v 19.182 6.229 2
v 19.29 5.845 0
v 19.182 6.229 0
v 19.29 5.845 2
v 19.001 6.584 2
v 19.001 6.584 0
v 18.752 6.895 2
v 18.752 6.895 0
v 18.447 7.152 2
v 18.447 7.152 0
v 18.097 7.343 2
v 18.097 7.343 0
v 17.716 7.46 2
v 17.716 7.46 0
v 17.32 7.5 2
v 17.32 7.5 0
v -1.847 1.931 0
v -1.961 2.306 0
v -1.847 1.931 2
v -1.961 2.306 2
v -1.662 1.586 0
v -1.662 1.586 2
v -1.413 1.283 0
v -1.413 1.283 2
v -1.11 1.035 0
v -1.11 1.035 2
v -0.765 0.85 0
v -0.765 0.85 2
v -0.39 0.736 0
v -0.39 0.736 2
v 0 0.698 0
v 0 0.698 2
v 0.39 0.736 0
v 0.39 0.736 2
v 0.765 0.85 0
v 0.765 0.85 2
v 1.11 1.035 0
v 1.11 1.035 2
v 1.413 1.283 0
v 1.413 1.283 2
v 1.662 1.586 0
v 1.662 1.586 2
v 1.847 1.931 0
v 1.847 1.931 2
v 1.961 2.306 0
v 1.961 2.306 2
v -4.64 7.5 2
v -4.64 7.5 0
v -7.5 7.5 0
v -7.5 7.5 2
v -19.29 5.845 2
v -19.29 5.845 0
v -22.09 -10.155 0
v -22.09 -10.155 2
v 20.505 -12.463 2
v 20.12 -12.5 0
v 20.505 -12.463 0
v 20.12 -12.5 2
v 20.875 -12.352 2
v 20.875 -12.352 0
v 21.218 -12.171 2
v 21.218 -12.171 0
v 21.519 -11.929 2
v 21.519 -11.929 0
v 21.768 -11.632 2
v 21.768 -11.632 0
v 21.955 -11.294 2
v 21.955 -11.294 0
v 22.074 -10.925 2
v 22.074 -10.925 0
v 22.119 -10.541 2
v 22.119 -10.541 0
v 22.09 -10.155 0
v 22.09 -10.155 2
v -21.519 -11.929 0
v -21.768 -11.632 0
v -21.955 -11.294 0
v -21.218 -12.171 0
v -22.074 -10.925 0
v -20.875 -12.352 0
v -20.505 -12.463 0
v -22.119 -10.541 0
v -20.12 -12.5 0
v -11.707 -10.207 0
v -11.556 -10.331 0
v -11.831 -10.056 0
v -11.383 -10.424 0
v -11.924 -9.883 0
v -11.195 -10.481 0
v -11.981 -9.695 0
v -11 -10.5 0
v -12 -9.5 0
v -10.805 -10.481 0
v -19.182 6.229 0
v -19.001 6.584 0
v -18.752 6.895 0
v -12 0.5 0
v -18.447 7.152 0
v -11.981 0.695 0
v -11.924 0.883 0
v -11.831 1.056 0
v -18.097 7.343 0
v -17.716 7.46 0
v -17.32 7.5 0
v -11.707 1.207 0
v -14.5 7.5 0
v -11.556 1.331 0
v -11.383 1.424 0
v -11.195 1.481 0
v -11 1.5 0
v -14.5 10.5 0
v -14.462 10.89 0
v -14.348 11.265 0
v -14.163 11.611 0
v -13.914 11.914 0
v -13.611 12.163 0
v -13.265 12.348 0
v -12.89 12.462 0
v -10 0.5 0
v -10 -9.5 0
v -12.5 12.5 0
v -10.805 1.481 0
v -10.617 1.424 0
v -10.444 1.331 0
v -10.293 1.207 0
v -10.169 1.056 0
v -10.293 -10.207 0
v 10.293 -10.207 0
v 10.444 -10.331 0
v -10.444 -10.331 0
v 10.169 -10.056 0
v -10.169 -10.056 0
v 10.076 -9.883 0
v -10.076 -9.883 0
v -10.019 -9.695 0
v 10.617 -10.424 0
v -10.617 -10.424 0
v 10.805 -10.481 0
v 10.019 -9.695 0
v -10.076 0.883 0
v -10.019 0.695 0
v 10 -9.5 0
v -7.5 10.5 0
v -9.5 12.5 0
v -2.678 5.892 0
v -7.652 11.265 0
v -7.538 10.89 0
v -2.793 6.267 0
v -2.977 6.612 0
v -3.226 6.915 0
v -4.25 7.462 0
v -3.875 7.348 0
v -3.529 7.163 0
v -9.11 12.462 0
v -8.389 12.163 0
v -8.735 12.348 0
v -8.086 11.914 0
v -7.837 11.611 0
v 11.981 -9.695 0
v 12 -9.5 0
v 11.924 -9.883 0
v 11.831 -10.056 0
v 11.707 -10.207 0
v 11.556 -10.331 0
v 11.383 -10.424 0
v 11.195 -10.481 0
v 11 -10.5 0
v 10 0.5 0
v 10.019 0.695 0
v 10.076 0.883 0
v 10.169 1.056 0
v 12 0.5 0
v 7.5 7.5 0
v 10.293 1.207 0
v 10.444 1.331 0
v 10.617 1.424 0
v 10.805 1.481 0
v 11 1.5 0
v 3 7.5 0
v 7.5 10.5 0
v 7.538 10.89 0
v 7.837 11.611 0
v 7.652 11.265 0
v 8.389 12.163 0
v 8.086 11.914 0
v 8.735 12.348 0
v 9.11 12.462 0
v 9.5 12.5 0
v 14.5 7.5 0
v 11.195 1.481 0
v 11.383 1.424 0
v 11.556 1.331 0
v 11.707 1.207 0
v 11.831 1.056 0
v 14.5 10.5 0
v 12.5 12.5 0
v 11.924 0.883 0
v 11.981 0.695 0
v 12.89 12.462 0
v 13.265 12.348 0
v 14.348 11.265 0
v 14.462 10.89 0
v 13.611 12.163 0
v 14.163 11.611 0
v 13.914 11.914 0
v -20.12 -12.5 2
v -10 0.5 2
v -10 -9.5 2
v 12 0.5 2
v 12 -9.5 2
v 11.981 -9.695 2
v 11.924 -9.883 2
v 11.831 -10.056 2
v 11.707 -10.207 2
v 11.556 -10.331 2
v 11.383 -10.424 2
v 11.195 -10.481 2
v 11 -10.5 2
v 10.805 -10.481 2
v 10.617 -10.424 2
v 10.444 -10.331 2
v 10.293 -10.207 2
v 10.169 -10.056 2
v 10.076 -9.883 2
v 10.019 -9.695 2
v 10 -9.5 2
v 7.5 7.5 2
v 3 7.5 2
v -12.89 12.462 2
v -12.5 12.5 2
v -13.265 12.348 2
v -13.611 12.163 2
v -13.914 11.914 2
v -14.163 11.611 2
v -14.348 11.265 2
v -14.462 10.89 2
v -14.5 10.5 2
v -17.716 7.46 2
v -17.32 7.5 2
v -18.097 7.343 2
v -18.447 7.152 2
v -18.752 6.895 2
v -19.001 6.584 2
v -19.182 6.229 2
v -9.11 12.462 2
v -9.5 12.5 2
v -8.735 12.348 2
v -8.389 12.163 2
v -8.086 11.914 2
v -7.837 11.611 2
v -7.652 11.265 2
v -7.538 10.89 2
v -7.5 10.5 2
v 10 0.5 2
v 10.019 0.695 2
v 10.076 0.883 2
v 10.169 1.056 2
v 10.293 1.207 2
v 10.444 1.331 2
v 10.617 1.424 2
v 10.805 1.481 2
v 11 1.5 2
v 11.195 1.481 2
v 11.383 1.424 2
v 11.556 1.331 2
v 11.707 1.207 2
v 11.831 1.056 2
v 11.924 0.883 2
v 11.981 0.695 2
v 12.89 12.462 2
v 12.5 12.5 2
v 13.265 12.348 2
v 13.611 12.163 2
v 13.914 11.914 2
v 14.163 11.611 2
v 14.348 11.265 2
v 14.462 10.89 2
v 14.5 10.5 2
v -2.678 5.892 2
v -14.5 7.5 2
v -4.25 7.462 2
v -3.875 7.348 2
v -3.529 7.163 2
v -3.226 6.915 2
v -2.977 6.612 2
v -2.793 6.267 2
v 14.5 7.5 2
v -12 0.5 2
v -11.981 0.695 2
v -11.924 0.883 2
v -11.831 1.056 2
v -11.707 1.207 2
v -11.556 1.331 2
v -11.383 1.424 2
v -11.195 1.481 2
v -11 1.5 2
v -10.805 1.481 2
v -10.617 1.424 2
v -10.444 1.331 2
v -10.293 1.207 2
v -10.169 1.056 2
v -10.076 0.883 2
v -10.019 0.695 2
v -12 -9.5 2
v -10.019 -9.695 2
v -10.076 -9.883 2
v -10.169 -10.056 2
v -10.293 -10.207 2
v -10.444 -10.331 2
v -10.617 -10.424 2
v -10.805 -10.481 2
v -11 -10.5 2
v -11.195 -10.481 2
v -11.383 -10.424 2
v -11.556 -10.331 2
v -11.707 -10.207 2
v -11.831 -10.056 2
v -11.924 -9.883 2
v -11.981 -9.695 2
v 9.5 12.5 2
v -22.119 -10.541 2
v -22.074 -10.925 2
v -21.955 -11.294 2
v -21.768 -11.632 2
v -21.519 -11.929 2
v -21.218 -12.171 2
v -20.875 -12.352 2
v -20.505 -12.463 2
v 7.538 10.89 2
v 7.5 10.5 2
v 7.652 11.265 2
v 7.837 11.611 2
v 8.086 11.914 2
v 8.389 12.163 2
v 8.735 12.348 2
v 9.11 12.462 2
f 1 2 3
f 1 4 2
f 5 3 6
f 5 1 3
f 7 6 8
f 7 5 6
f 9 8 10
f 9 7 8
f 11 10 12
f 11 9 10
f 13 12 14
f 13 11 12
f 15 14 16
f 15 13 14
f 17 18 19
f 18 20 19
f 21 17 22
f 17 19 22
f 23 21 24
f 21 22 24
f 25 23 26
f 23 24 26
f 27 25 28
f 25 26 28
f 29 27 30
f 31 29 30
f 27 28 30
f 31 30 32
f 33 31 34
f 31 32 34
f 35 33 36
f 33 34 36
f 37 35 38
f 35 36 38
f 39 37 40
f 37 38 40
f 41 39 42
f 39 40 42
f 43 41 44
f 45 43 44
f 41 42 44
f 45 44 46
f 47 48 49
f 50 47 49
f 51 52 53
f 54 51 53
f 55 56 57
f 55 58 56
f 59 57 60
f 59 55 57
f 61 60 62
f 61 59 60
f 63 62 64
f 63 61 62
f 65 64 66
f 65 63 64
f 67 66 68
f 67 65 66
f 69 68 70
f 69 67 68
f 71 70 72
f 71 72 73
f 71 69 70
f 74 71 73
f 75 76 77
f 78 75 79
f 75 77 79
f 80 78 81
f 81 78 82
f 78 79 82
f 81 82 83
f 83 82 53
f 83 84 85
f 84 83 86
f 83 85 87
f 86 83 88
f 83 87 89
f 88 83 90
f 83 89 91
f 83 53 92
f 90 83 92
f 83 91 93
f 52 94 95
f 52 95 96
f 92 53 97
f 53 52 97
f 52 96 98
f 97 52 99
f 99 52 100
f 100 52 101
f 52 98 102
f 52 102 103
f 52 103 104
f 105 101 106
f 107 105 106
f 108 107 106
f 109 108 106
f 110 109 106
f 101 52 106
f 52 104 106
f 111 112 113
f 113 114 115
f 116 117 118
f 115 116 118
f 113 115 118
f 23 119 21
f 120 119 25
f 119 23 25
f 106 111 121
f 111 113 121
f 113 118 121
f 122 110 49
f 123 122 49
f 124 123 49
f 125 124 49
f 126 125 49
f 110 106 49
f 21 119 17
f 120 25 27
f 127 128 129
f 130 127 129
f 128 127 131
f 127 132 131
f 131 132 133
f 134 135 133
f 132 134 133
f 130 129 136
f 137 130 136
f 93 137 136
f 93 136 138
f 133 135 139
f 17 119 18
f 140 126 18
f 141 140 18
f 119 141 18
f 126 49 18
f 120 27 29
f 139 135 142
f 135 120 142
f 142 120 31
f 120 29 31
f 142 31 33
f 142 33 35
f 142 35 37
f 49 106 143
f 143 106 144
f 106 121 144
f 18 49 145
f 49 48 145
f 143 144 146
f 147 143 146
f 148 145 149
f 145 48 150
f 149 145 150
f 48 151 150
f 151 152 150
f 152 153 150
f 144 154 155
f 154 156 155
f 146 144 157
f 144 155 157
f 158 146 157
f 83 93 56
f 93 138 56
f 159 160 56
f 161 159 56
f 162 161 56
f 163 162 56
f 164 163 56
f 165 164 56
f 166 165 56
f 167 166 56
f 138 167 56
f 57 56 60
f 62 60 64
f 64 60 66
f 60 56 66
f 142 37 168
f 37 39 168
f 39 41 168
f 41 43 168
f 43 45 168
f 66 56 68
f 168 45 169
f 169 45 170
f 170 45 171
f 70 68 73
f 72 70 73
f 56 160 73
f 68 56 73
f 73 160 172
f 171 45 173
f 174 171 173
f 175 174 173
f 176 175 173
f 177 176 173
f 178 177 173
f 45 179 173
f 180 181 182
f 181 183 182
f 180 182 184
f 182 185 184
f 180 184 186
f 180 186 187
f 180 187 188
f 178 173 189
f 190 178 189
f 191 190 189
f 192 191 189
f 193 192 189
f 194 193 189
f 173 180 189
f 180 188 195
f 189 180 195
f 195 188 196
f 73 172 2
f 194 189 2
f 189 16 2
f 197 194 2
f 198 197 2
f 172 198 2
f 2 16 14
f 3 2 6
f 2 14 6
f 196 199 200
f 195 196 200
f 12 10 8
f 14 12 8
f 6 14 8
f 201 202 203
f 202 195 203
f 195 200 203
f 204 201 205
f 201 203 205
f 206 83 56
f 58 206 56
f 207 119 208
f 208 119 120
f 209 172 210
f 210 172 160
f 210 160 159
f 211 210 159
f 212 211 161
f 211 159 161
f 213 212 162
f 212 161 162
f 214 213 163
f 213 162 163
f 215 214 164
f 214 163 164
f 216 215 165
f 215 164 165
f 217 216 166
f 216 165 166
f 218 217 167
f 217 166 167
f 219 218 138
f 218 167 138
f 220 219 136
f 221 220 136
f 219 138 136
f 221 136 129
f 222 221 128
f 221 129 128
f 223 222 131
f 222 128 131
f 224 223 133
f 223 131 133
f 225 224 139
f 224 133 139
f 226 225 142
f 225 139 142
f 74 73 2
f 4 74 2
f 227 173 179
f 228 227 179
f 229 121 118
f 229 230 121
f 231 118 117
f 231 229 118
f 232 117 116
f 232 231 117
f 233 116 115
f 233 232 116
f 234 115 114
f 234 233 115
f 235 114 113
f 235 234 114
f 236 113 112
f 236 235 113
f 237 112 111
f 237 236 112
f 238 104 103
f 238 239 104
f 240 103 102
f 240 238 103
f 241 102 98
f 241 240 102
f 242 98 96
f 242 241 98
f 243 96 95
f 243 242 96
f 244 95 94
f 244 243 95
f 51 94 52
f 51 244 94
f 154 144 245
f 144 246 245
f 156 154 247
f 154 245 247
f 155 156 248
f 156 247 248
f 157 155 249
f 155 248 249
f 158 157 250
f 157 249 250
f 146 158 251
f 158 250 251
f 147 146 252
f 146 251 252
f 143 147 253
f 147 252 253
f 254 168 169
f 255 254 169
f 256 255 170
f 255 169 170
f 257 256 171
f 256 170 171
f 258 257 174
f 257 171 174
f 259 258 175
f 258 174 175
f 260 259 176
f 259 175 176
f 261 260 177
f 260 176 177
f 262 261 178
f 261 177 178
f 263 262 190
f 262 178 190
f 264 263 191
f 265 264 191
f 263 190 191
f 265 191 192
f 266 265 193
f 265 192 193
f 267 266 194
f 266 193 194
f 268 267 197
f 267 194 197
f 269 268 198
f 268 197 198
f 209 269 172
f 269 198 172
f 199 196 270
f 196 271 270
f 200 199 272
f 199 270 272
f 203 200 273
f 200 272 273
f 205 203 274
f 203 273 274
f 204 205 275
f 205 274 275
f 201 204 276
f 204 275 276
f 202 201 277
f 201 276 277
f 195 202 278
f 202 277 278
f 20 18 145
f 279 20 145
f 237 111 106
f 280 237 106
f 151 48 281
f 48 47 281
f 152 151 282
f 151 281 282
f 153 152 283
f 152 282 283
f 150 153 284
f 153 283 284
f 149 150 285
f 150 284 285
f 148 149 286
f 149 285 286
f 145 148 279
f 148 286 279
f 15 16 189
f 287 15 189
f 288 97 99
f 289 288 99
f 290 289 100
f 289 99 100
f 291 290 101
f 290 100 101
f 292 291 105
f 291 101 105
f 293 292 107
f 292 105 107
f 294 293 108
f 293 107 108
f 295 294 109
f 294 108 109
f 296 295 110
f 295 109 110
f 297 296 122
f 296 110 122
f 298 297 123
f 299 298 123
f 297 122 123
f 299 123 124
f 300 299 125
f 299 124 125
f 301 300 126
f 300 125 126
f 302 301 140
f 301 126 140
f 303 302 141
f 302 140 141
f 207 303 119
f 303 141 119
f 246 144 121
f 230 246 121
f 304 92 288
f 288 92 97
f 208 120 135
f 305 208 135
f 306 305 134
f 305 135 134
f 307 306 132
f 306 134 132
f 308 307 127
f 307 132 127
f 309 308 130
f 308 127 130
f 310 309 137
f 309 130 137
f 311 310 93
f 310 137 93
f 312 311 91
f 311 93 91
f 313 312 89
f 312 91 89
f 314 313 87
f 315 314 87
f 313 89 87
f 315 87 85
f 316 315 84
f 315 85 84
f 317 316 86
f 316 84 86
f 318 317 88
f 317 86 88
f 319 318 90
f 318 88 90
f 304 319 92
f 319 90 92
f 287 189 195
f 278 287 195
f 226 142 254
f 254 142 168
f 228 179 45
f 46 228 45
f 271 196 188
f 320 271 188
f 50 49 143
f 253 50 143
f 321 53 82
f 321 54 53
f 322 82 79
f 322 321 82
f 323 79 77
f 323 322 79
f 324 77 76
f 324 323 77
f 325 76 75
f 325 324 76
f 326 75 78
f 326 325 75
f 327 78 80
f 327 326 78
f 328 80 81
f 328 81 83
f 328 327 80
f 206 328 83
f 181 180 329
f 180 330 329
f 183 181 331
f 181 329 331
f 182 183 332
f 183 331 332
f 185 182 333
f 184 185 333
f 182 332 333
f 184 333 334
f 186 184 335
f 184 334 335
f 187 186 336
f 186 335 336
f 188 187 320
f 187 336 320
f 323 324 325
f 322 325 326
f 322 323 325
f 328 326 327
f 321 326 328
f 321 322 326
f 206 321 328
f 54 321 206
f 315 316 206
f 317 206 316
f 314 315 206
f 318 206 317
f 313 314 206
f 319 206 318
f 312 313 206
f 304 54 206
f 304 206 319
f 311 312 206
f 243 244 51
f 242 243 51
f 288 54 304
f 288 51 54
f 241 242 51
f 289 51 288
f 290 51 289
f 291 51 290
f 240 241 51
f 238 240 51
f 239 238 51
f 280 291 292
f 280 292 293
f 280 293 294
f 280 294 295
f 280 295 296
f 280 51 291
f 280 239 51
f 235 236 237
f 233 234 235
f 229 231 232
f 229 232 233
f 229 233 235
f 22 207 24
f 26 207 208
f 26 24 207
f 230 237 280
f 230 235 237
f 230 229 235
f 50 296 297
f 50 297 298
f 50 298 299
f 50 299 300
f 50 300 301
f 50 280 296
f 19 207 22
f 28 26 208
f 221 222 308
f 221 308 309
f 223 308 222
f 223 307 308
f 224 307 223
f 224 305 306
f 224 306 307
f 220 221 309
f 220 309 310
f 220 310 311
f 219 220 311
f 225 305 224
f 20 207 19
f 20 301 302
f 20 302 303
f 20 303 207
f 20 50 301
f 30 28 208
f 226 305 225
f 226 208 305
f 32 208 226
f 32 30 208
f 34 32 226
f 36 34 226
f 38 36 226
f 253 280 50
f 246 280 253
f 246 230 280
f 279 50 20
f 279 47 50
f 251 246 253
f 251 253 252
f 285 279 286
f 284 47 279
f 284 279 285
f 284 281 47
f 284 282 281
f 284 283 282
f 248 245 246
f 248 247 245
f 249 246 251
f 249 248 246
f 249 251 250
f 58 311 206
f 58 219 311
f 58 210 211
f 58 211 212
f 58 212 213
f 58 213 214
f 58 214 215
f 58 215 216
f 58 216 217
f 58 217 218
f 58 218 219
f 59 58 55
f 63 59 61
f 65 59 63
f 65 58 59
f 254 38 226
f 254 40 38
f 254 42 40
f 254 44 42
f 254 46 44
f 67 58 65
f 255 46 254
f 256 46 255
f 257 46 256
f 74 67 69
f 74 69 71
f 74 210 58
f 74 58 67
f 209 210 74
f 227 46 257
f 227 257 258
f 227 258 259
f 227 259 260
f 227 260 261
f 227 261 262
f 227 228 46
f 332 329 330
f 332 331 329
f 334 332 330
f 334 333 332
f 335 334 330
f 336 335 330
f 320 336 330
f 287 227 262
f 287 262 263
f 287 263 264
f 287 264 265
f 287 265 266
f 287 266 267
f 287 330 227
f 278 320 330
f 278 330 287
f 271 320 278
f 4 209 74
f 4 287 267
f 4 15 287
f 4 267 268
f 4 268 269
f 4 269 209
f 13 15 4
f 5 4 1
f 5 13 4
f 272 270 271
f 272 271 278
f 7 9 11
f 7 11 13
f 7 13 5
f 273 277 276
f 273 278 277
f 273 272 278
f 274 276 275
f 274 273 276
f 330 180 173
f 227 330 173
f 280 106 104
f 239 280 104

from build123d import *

# Parameters (mm, degrees)
RESSALTO_EXTRUS_O1_DEPTH = 2
FILETE1_R                = 2


with BuildPart() as part:
    # Esboço1 → Ressalto-extrusão1 (new body)
    with BuildSketch(Plane.XY):
        Polygon((-7.5, 12.5), (-14.5, 12.5), (-14.5, 7.5), (-19, 7.5), (-22.5, -12.5), (22.5, -12.5), (19, 7.5), (14.5, 7.5), (14.5, 12.5), (7.5, 12.5), (7.5, 7.5), (3, 7.5), (0, -7.5), (-3, 7.5), (-7.5, 7.5), align=None)
        with BuildLine():
            ThreePointArc((-12, 0.5), (-11, 1.5), (-10, 0.5))
            Line((-10, 0.5), (-10, -9.5))
            ThreePointArc((-10, -9.5), (-11, -10.5), (-12, -9.5))
            Line((-12, -9.5), (-12, 0.5))
        make_face(mode=Mode.SUBTRACT)
        with BuildLine():
            Line((10, -9.5), (10, 0.5))
            ThreePointArc((10, 0.5), (11, 1.5), (12, 0.5))
            Line((12, 0.5), (12, -9.5))
            ThreePointArc((12, -9.5), (11, -10.5), (10, -9.5))
        make_face(mode=Mode.SUBTRACT)
    extrude(amount=RESSALTO_EXTRUS_O1_DEPTH)

    # Filete1
    filete1_edges = [part.edges().sort_by_distance(p)[0] for p in [
        (-22.5, -12.5, 1),
        (-19, 7.5, 1),
        (-14.5, 12.5, 1),
        (-7.5, 12.5, 1),
        (-3, 7.5, 1),
        (0, -7.5, 1),
        (7.5, 12.5, 1),
        (14.5, 12.5, 1),
        (19, 7.5, 1),
        (22.5, -12.5, 1),
    ]]
    fillet(filete1_edges, radius=FILETE1_R)


solid = part.part
